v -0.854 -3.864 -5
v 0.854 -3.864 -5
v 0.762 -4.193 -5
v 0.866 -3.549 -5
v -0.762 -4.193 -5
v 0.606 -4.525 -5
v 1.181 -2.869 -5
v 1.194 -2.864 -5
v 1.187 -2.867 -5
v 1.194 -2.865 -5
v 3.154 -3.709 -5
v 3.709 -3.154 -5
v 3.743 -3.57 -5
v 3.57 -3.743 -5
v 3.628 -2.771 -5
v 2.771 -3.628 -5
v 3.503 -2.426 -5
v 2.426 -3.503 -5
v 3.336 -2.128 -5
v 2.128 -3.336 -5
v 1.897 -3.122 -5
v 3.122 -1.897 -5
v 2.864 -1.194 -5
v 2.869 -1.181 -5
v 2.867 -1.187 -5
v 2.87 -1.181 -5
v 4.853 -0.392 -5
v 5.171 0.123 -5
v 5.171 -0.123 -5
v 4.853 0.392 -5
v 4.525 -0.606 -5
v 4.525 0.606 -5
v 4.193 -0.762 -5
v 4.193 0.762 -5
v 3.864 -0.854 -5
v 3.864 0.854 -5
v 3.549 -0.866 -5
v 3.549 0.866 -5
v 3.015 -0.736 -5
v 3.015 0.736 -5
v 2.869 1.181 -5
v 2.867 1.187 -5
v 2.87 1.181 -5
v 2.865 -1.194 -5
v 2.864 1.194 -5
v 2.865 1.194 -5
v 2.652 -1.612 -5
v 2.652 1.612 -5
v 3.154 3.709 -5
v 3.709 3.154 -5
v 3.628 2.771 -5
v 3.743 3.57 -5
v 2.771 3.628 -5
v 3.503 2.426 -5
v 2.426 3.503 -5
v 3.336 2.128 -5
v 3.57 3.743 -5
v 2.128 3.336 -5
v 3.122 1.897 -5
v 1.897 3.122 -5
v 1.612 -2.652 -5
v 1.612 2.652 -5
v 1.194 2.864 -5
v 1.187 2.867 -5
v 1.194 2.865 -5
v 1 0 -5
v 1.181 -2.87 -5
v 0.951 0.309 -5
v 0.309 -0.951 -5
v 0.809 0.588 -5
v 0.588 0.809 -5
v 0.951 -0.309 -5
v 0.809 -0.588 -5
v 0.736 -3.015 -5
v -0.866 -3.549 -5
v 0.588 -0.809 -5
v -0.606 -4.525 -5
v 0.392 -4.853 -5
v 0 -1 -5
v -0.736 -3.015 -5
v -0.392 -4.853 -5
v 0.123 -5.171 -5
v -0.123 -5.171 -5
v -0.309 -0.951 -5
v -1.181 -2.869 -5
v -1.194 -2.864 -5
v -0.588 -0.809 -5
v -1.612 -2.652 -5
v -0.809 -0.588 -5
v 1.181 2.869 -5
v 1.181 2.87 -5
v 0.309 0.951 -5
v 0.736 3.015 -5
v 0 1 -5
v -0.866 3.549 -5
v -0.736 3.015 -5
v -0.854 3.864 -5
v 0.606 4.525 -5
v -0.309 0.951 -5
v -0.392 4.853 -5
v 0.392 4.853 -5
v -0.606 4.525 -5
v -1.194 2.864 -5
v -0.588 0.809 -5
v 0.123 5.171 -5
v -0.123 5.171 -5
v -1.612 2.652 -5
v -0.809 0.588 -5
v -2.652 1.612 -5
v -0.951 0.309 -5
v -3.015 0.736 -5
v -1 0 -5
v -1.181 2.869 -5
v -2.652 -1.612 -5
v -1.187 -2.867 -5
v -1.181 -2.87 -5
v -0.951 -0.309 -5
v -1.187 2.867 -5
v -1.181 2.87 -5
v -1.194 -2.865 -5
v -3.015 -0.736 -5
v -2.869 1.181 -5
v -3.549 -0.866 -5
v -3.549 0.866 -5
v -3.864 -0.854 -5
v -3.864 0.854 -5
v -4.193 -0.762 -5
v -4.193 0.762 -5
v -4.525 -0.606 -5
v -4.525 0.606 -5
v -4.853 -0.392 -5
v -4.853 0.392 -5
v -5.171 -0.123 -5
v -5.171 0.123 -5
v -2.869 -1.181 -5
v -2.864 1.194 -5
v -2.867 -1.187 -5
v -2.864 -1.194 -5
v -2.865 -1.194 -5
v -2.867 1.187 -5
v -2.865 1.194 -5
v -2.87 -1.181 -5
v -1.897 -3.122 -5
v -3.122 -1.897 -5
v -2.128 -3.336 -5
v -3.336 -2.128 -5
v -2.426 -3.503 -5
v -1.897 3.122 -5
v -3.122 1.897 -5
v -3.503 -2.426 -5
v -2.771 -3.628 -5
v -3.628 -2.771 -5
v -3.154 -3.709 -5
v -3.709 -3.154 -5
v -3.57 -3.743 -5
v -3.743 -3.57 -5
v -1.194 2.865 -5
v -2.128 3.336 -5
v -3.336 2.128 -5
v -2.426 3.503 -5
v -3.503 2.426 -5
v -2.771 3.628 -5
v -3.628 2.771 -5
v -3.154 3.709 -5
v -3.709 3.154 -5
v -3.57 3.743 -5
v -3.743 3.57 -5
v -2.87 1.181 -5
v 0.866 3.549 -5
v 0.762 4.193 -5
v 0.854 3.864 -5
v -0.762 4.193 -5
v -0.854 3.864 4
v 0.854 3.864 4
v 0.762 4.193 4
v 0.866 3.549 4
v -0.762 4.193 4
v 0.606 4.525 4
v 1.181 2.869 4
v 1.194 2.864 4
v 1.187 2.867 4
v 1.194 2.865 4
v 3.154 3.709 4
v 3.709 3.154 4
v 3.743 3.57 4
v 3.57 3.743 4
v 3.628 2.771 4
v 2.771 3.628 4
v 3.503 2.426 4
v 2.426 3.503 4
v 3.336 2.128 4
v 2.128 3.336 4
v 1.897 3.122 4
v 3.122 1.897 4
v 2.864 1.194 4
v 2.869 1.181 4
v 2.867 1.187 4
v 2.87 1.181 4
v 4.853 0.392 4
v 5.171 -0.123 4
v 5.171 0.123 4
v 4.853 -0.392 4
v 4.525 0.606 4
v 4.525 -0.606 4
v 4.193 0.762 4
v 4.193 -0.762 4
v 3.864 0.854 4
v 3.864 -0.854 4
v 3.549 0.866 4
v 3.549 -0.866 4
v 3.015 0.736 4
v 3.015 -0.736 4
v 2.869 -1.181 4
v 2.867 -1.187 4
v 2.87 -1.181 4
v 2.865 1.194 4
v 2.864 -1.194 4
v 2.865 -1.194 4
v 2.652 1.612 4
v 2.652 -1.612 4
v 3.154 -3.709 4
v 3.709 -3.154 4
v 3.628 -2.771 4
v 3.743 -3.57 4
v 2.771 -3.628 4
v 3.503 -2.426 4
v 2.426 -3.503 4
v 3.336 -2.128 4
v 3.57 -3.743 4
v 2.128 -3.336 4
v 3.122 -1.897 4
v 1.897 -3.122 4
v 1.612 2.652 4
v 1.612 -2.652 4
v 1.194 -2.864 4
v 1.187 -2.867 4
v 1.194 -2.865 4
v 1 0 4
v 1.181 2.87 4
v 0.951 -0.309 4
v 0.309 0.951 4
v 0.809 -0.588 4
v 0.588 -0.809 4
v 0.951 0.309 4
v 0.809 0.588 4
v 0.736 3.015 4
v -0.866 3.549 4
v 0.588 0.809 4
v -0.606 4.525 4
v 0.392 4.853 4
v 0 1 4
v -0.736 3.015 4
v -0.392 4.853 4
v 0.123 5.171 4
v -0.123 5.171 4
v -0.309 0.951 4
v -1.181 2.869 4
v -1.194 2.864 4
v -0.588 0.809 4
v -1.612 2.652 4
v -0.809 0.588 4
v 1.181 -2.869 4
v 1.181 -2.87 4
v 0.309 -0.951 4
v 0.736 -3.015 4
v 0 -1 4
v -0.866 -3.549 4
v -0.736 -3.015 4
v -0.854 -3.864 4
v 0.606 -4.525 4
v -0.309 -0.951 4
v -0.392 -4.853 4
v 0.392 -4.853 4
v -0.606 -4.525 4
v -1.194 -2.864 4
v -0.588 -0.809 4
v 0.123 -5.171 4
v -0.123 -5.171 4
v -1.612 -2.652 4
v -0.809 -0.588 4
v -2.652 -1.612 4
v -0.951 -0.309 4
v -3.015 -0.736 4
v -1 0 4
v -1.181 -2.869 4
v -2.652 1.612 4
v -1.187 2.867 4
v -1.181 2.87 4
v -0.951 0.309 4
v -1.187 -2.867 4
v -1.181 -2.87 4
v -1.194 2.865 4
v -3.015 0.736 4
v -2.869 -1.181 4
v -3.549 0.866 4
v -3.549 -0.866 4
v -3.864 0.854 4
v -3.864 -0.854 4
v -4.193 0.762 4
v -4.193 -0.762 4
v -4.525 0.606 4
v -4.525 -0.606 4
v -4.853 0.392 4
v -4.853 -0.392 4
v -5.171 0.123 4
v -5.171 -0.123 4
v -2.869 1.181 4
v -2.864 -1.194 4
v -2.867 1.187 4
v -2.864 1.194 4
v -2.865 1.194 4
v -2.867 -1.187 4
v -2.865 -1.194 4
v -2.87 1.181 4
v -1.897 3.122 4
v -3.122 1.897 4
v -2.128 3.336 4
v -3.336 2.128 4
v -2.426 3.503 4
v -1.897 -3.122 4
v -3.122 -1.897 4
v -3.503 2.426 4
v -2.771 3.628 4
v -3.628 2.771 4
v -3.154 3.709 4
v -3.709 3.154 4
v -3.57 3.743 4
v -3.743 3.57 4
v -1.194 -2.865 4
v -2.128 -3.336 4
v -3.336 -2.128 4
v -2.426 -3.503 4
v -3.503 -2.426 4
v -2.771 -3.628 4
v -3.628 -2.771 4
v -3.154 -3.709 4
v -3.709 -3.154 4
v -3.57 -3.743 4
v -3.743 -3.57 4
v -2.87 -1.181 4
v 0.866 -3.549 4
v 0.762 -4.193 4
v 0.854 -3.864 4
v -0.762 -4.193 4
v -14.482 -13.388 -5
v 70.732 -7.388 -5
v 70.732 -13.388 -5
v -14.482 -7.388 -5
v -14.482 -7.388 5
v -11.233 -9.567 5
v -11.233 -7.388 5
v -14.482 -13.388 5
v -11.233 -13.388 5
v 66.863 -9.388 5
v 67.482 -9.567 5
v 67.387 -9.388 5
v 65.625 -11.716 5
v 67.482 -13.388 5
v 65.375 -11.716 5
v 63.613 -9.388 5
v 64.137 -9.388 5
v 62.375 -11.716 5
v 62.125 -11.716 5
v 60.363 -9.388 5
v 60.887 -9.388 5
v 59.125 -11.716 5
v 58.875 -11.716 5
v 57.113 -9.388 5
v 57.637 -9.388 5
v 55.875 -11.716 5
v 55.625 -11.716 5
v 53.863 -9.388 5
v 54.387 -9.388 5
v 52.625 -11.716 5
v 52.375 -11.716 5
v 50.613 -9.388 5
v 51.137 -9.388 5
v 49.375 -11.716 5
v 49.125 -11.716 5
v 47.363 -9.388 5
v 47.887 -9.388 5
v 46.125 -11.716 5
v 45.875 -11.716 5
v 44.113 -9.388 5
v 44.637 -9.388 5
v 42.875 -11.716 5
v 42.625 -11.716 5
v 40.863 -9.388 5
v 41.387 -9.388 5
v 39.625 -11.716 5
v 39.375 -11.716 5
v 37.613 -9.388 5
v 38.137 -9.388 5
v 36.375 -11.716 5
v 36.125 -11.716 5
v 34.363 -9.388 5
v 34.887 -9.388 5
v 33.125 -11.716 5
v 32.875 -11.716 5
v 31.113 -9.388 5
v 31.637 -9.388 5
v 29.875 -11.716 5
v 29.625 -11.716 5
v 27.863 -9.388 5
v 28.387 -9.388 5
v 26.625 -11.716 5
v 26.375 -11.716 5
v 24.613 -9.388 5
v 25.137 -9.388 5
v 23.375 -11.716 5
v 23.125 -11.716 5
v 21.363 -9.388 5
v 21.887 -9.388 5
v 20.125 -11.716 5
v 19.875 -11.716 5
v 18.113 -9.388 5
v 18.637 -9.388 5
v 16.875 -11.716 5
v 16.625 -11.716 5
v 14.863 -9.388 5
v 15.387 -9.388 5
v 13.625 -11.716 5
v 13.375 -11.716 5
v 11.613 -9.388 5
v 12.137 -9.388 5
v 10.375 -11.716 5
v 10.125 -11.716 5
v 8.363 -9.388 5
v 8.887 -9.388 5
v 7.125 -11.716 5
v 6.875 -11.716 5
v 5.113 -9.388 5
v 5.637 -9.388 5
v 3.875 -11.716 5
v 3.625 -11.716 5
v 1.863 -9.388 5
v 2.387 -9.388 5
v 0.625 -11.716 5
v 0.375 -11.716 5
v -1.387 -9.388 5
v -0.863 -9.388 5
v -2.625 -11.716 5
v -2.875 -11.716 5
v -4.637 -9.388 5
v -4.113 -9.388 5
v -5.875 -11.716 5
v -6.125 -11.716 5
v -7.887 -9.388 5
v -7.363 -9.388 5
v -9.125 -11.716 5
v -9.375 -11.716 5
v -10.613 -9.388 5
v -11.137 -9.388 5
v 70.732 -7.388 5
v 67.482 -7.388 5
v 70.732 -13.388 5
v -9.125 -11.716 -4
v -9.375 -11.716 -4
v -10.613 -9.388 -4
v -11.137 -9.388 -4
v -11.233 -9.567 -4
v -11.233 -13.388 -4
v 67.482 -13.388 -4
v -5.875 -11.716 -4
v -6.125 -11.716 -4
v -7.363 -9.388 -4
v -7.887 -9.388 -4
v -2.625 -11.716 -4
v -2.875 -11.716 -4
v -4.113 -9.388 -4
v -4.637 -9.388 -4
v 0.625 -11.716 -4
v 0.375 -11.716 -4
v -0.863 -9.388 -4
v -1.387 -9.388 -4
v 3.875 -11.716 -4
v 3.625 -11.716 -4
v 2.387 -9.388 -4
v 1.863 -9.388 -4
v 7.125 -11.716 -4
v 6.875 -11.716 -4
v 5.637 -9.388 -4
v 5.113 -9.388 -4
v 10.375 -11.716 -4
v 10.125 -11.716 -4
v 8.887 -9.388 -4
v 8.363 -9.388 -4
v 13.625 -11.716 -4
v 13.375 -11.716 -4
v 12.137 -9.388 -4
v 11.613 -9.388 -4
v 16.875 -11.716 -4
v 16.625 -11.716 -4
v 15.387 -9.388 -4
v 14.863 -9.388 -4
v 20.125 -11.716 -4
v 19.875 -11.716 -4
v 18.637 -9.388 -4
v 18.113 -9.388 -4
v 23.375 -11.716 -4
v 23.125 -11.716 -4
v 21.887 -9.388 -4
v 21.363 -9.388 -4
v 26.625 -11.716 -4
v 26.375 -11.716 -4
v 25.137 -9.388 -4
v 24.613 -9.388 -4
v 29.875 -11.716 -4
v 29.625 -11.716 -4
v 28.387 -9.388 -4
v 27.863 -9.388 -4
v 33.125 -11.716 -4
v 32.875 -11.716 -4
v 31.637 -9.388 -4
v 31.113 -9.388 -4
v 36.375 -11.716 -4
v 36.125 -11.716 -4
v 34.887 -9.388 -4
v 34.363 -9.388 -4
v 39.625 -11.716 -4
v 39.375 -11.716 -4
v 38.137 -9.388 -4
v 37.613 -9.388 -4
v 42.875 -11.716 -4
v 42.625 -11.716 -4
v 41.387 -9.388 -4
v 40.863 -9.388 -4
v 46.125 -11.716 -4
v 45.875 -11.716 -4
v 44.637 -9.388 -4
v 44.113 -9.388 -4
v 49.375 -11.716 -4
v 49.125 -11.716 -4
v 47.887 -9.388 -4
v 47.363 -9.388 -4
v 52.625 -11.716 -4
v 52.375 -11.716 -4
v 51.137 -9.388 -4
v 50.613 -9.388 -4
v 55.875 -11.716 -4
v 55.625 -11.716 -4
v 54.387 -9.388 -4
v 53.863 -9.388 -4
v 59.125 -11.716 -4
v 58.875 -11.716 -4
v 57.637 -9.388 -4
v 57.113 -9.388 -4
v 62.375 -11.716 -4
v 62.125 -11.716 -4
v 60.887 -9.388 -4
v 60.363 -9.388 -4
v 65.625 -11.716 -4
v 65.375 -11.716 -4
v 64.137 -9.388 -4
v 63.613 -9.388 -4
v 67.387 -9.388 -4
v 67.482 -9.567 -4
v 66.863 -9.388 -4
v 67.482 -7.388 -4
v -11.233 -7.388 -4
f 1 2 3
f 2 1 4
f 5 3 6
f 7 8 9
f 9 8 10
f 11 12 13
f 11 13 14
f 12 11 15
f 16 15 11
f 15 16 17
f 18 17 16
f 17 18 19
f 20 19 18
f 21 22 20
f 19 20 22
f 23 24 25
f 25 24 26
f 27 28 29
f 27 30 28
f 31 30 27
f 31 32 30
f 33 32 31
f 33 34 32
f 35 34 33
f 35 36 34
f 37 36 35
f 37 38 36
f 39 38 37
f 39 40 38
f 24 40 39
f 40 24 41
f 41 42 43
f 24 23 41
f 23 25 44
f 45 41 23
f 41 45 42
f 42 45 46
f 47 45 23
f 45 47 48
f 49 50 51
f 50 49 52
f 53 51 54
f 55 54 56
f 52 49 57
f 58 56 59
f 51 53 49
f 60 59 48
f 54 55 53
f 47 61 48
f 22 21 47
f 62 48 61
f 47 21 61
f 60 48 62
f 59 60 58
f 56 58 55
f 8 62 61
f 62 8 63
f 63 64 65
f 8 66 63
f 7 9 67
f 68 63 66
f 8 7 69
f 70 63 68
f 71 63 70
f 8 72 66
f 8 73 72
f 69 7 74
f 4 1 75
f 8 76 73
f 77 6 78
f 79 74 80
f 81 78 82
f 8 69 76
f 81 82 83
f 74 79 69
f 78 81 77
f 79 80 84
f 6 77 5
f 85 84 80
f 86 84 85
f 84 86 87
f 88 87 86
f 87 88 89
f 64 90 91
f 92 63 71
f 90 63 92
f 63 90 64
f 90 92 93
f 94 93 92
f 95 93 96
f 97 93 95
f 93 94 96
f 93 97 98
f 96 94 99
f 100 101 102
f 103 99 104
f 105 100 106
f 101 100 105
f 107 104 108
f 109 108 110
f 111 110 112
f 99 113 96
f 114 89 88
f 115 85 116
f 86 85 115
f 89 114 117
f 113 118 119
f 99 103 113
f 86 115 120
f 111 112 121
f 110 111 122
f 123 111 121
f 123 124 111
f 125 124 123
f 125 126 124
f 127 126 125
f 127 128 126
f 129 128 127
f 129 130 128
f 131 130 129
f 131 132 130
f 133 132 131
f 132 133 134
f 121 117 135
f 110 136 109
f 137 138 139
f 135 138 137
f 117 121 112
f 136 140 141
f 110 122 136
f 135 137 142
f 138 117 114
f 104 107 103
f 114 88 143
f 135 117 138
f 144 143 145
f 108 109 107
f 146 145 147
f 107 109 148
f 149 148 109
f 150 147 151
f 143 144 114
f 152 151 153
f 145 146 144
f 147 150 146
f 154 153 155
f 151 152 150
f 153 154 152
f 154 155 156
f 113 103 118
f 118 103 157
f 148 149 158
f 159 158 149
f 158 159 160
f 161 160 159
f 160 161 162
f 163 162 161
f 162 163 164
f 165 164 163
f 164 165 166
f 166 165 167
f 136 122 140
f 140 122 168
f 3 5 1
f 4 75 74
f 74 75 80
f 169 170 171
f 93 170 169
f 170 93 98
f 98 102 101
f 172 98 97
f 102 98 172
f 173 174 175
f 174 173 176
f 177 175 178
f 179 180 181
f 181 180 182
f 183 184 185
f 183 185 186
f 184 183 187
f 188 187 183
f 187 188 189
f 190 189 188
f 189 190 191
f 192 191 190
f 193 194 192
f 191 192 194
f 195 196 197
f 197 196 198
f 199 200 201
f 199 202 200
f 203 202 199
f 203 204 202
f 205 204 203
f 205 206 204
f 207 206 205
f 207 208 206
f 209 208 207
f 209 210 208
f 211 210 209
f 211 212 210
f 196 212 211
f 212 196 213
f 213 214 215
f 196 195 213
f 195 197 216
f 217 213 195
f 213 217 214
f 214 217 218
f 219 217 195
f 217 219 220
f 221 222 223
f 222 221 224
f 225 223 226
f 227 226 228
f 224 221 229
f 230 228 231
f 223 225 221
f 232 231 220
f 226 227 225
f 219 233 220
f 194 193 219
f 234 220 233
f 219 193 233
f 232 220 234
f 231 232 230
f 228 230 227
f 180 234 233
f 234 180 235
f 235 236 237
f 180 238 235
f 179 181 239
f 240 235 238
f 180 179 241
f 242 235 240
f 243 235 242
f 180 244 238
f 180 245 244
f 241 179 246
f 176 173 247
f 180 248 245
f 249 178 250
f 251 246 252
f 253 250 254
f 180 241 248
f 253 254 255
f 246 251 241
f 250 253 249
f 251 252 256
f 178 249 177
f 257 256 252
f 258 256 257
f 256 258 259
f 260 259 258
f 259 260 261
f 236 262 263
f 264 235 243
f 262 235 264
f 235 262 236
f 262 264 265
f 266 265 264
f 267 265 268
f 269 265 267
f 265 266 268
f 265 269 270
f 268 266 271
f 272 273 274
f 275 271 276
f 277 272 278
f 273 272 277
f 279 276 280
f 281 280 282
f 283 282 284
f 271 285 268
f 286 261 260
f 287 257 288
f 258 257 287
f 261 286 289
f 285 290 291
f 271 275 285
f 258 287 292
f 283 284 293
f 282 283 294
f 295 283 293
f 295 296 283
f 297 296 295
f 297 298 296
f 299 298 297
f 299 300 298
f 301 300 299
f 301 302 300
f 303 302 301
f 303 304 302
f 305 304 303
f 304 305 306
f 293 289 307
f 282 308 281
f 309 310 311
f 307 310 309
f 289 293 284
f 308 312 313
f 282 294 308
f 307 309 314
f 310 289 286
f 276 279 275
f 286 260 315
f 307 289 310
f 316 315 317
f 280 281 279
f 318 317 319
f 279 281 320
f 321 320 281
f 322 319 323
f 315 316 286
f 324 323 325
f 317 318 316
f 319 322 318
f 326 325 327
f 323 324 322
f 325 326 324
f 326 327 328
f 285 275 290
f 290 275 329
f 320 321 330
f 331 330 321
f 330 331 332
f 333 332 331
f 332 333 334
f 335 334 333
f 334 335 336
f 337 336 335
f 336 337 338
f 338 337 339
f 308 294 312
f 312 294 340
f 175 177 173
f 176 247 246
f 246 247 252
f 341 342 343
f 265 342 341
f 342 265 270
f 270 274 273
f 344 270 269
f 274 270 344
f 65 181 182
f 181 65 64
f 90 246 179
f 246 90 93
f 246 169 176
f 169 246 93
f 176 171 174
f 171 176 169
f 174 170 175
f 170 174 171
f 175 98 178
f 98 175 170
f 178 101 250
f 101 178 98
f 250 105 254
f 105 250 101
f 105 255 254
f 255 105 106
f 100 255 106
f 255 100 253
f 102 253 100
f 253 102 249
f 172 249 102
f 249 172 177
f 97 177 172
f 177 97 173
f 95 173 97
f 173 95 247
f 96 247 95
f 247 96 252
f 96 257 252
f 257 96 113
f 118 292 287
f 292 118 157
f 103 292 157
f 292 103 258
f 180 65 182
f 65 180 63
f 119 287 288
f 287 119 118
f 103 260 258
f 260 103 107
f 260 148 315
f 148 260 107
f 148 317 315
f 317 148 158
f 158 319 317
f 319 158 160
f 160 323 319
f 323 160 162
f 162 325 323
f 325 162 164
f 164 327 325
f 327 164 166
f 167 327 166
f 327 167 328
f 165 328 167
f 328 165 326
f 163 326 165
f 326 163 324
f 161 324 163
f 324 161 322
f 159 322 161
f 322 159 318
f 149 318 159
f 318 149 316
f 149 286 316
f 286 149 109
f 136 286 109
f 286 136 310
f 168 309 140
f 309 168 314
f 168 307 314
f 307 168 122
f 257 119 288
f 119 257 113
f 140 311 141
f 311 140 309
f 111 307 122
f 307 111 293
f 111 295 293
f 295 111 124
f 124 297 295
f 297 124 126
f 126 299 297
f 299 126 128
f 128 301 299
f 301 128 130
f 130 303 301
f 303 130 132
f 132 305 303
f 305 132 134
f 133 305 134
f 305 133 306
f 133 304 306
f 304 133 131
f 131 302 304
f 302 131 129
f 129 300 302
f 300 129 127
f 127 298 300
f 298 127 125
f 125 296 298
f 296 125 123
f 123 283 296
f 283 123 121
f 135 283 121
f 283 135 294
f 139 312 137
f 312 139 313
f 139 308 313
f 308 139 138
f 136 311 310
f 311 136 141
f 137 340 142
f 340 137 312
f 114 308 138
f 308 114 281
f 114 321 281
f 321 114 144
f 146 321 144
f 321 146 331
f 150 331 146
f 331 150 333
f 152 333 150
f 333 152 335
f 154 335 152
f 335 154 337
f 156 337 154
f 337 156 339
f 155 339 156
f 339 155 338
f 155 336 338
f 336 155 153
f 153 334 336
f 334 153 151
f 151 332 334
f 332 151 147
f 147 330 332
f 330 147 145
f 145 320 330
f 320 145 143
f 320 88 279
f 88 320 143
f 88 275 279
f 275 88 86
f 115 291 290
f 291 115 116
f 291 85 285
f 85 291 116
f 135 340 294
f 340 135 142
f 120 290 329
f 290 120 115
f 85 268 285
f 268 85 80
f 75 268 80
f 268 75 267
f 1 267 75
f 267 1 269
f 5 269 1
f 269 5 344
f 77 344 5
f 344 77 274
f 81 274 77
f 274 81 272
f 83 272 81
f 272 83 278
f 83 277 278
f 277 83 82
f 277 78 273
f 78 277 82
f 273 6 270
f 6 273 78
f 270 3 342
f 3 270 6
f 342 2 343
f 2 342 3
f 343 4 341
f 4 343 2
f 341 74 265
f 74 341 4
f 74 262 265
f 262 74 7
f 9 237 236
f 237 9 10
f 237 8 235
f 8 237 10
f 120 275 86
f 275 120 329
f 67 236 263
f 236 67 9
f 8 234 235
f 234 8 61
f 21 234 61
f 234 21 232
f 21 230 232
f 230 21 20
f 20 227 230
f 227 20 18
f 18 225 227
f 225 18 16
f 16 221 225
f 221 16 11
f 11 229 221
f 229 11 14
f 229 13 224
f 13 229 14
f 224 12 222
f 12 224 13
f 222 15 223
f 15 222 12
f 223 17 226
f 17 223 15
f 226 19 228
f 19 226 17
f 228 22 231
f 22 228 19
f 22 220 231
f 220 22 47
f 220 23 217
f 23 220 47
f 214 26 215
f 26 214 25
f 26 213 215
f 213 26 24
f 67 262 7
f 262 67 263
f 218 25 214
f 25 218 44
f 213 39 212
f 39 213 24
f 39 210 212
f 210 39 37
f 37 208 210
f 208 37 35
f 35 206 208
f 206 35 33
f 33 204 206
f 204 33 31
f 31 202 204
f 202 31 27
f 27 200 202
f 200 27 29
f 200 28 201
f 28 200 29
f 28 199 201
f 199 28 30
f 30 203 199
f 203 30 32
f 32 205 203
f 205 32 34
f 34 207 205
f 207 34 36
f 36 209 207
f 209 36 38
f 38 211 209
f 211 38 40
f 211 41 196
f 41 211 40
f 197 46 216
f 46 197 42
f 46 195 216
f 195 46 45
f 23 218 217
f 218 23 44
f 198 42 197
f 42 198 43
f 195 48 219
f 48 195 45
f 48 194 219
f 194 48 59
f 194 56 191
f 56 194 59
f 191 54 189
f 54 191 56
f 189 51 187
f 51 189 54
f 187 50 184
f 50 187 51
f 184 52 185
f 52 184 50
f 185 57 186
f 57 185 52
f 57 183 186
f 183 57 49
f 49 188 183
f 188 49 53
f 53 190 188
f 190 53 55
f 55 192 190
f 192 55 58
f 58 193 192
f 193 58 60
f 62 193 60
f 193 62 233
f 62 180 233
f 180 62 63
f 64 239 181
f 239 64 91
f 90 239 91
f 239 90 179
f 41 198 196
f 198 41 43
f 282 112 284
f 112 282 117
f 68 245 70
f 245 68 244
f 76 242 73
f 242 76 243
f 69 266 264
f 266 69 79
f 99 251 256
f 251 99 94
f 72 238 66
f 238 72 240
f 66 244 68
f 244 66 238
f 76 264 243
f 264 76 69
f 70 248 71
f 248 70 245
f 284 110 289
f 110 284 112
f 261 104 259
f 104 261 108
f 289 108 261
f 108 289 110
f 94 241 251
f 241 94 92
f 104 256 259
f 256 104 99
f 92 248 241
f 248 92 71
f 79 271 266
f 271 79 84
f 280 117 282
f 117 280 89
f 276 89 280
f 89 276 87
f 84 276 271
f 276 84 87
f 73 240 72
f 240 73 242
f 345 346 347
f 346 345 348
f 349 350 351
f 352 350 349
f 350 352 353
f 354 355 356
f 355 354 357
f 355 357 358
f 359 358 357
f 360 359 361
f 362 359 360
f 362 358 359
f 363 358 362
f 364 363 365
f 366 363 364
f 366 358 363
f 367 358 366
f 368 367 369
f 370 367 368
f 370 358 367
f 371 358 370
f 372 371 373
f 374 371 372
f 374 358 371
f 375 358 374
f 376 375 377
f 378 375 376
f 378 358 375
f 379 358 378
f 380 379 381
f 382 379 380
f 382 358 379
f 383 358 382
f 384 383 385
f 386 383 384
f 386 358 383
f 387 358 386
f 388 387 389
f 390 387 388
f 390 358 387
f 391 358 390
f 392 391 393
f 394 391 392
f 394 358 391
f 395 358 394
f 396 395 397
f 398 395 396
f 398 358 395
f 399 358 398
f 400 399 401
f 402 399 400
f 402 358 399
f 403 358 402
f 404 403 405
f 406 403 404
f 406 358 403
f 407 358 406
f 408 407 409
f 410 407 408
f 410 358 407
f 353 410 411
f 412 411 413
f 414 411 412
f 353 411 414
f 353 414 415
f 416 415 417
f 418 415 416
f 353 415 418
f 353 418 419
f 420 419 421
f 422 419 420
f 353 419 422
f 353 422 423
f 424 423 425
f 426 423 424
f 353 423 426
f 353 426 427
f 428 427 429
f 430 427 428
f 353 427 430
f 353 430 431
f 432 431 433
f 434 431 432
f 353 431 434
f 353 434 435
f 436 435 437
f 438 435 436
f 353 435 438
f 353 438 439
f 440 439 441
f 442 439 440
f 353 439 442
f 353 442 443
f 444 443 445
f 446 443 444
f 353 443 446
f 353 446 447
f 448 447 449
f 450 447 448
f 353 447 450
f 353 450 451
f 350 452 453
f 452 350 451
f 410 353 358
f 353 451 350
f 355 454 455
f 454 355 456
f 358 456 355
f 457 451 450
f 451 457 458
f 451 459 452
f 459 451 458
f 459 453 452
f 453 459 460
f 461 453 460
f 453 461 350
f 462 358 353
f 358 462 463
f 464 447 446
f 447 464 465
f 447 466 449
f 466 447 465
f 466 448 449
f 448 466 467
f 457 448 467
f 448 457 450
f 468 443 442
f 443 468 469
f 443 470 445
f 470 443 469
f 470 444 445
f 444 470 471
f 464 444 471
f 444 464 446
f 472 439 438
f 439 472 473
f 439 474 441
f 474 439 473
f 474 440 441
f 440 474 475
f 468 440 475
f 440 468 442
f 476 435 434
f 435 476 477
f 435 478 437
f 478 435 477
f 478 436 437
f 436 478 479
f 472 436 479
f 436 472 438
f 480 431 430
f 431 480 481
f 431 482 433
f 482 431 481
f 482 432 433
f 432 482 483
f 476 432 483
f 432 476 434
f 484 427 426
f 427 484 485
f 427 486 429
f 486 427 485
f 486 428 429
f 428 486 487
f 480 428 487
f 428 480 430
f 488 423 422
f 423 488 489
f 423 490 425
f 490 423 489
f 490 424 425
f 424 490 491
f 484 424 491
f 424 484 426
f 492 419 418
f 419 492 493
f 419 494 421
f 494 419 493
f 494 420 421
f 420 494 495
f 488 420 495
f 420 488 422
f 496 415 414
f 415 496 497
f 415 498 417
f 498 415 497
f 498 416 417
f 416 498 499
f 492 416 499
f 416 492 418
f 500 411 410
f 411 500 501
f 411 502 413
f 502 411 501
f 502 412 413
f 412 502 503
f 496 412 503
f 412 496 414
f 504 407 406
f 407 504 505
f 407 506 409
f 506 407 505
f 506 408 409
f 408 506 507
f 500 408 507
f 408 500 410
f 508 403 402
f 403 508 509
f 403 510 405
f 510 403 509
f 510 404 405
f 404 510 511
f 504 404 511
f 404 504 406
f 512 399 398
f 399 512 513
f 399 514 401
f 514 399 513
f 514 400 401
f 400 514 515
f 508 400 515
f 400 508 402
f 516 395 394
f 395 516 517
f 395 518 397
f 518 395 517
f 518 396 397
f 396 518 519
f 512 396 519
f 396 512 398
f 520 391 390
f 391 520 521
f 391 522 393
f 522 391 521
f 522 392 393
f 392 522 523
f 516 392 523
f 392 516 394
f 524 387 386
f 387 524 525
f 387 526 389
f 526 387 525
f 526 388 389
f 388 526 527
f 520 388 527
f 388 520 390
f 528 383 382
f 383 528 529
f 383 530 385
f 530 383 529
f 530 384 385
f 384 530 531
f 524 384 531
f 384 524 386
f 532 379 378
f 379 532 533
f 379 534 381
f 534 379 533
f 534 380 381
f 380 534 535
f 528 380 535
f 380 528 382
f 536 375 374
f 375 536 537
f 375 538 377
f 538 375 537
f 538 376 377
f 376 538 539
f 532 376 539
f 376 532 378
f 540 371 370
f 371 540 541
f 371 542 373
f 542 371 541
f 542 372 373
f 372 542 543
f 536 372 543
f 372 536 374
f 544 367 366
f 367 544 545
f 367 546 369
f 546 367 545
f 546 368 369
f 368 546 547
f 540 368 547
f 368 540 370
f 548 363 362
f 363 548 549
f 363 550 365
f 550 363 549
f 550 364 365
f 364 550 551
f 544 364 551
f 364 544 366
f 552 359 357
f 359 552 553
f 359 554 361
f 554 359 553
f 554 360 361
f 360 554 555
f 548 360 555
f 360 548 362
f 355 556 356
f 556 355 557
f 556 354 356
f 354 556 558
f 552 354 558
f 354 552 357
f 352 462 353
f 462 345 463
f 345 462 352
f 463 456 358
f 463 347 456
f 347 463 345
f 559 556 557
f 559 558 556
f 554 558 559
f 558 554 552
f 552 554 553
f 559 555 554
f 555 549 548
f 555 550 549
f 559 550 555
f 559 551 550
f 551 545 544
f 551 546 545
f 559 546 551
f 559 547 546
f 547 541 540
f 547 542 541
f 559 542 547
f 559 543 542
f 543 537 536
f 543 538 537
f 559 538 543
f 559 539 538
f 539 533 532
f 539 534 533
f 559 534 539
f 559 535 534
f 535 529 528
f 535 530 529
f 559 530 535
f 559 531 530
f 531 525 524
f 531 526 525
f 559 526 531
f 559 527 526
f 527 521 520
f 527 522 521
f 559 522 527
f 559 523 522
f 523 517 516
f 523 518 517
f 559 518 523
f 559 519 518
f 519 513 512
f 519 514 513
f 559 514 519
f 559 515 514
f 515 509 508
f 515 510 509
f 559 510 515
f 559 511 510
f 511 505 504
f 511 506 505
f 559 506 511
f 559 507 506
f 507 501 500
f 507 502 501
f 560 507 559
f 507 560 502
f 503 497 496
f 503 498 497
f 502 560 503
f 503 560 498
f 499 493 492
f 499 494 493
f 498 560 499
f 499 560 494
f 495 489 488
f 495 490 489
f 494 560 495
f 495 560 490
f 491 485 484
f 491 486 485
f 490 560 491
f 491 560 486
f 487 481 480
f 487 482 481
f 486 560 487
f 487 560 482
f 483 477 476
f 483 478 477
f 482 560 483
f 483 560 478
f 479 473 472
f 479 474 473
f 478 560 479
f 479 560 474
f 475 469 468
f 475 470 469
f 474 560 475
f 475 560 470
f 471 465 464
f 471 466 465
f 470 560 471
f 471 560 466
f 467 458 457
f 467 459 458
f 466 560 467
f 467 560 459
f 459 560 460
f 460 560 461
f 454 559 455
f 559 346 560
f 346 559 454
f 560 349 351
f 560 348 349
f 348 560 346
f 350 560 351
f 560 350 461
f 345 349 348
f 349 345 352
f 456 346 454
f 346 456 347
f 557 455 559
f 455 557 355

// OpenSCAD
//This is a modification of " Public Domain Parametric Involute Spur Gear (and involute helical gear and involute rack)
// by Leemon Baird, 2011, Leemon@Leemon.com
//http://www.thingiverse.com/thing:5505  "

//Modifications by racatack June 2016:
//  -Incorporated 'module InvoluteGear_rack()' from the 11/11/15 comment by quisam2342 in thing:5505 to fix noted problems in rack generation at various tooth sizes
//  -Added a section for an optional 'backboard' that can be used to stiffen an otherwise skinny rack
//  -Added sections for optional Stop Blocks at either or both ends of a rack
//  -Removed extra gears from the example since I only need one pinion. See thing:5505 example section to gain more insight into gear generation.





//////////////////////////////////////////////////////////////////////////////////////////////
// Public Domain Parametric Involute Spur Gear (and involute helical gear and involute rack)
// version 1.1
// by Leemon Baird, 2011, Leemon@Leemon.com
//http://www.thingiverse.com/thing:5505
//
// This file is public domain.  Use it for any purpose, including commercial
// applications.  Attribution would be nice, but is not required.  There is
// no warranty of any kind, including its correctness, usefulness, or safety.
// 
// This is parameterized involute spur (or helical) gear.  It is much simpler and less powerful than
// others on Thingiverse.  But it is public domain.  I implemented it from scratch from the 
// descriptions and equations on Wikipedia and the web, using Mathematica for calculations and testing,
// and I now release it into the public domain.
//
//		http://en.wikipedia.org/wiki/Involute_gear
//		http://en.wikipedia.org/wiki/Gear
//		http://en.wikipedia.org/wiki/List_of_gear_nomenclature
//		http://gtrebaol.free.fr/doc/catia/spur_gear.html
//		http://www.cs.cmu.edu/~rapidproto/mechanisms/chpt7.html
//
// The module gear() gives an involute spur gear, with reasonable defaults for all the parameters.
// Normally, you should just choose the first 4 parameters, and let the rest be default values.
// The module gear() gives a gear in the XY plane, centered on the origin, with one tooth centered on
// the positive Y axis.  The various functions below it take the same parameters, and return various
// measurements for the gear.  The most important is pitch_radius, which tells how far apart to space
// gears that are meshing, and adendum_radius, which gives the size of the region filled by the gear.
// A gear has a "pitch circle", which is an invisible circle that cuts through the middle of each
// tooth (though not the exact center). In order for two gears to mesh, their pitch circles should 
// just touch.  So the distance between their centers should be pitch_radius() for one, plus pitch_radius() 
// for the other, which gives the radii of their pitch circles.
//
// In order for two gears to mesh, they must have the same mm_per_tooth and pressure_angle parameters.  
// mm_per_tooth gives the number of millimeters of arc around the pitch circle covered by one tooth and one
// space between teeth.  The pitch angle controls how flat or bulged the sides of the teeth are.  Common
// values include 14.5 degrees and 20 degrees, and occasionally 25.  Though I've seen 28 recommended for
// plastic gears. Larger numbers bulge out more, giving stronger teeth, so 28 degrees is the default here.
//
// The ratio of number_of_teeth for two meshing gears gives how many times one will make a full 
// revolution when the the other makes one full revolution.  If the two numbers are coprime (i.e. 
// are not both divisible by the same number greater than 1), then every tooth on one gear
// will meet every tooth on the other, for more even wear.  So coprime numbers of teeth are good.
//
// The module rack() gives a rack, which is a bar with teeth.  A rack can mesh with any
// gear that has the same mm_per_tooth and pressure_angle.
//
// Some terminology: 
// The outline of a gear is a smooth circle (the "pitch circle") which has mountains and valleys
// added so it is toothed.  So there is an inner circle (the "root circle") that touches the 
// base of all the teeth, an outer circle that touches the tips of all the teeth,
// and the invisible pitch circle in between them.  There is also a "base circle", which can be smaller than
// all three of the others, which controls the shape of the teeth.  The side of each tooth lies on the path 
// that the end of a string would follow if it were wrapped tightly around the base circle, then slowly unwound.  
// That shape is an "involute", which gives this type of gear its name.
//
//////////////////////////////////////////////////////////////////////////////////////////////

//An involute spur gear, with reasonable defaults for all the parameters.
//Normally, you should just choose the first 4 parameters, and let the rest be default values.
//Meshing gears must match in mm_per_tooth, pressure_angle, and twist,
//and be separated by the sum of their pitch radii, which can be found with pitch_radius().
module gear (
	mm_per_tooth    = 3,    //this is the "circular pitch", the circumference of the pitch circle divided by the number of teeth
	number_of_teeth = 11,   //total number of teeth around the entire perimeter
	thickness       = 6,    //thickness of gear in mm
	hole_diameter   = 3,    //diameter of the hole in the center, in mm
	twist           = 0,    //teeth rotate this many degrees from bottom of gear to top.  360 makes the gear a screw with each thread going around once
	teeth_to_hide   = 0,    //number of teeth to delete to make this only a fraction of a circle
	pressure_angle  = 28,   //Controls how straight or bulged the tooth sides are. In degrees.
	clearance       = 0.0,  //gap between top of a tooth on one gear and bottom of valley on a meshing gear (in millimeters)
	backlash        = 0.0   //gap between two meshing teeth, in the direction along the circumference of the pitch circle
) {
	assign(pi = 3.1415926)
	assign(p  = mm_per_tooth * number_of_teeth / pi / 2)  //radius of pitch circle
	assign(c  = p + mm_per_tooth / pi - clearance)        //radius of outer circle
	assign(b  = p*cos(pressure_angle))                    //radius of base circle
	assign(r  = p-(c-p)-clearance)                        //radius of root circle
	assign(t  = mm_per_tooth/2-backlash/2)                //tooth thickness at pitch circle
	assign(k  = -iang(b, p) - t/2/p/pi*180) {             //angle to where involute meets base circle on each side of tooth
		difference() {
			for (i = [0:number_of_teeth-teeth_to_hide-1] )
				rotate([0,0,i*360/number_of_teeth])
					linear_extrude(height = thickness, center = true, convexity = 10, twist = twist)
						polygon(
							points=[
								[0, -hole_diameter/10],
								polar(r, -181/number_of_teeth),
								polar(r, r<b ? k : -180/number_of_teeth),
								q7(0/5,r,b,c,k, 1),q7(1/5,r,b,c,k, 1),q7(2/5,r,b,c,k, 1),q7(3/5,r,b,c,k, 1),q7(4/5,r,b,c,k, 1),q7(5/5,r,b,c,k, 1),
								q7(5/5,r,b,c,k,-1),q7(4/5,r,b,c,k,-1),q7(3/5,r,b,c,k,-1),q7(2/5,r,b,c,k,-1),q7(1/5,r,b,c,k,-1),q7(0/5,r,b,c,k,-1),
								polar(r, r<b ? -k : 180/number_of_teeth),
								polar(r, 181/number_of_teeth)
							],
 							paths=[[0,1,2,3,4,5,6,7,8,9,10,11,12,13,14,15,16]]
						);
			cylinder(h=2*thickness+1, r=hole_diameter/2, center=true, $fn=20);
		}
	}
};	
//these 4 functions are used by gear
function polar(r,theta)   = r*[sin(theta), cos(theta)];                            //convert polar to cartesian coordinates
function iang(r1,r2)      = sqrt((r2/r1)*(r2/r1) - 1)/3.1415926*180 - acos(r1/r2); //unwind a string this many degrees to go from radius r1 to radius r2
function q7(f,r,b,r2,t,s) = q6(b,s,t,(1-f)*max(b,r)+f*r2);                         //radius a fraction f up the curved side of the tooth 
function q6(b,s,t,d)      = polar(d,s*(iang(b,d)+t));                              //point at radius d on the involute curve

//a rack, which is a straight line with teeth (the same as a segment from a giant gear with a huge number of teeth).
//The "pitch circle" is a line along the X axis.
//module rack (
//	mm_per_tooth    = 3,    //this is the "circular pitch", the circumference of the pitch circle divided by the number //of teeth
//	number_of_teeth = 11,   //total number of teeth along the rack
//	thickness       = 6,    //thickness of rack in mm (affects each tooth)
//	height          = 120,   //height of rack in mm, from tooth top to far side of rack.
//	pressure_angle  = 28,   //Controls how straight or bulged the tooth sides are. In degrees.
//	backlash        = 0.0   //gap between two meshing teeth, in the direction along the circumference of the pitch circle
//) {
//	assign(pi = 3.1415926)
//	assign(a = mm_per_tooth / pi) //addendum
//	assign(t = a*cos(pressure_angle)-1)         //tooth side is tilted so top/bottom corners move this amount
//		for (i = [0:number_of_teeth-1] )
//			translate([i*mm_per_tooth,0,0])
//				linear_extrude(height = thickness, center = true, convexity = 10)
//					polygon(
//						points=[
//							[-mm_per_tooth * 3/4,                 a-height],
//							[-mm_per_tooth * 3/4 - backlash,     -a],
//							[-mm_per_tooth * 1/4 + backlash - t, -a],
//							[-mm_per_tooth * 1/4 + backlash + t,  a],
//							[ mm_per_tooth * 1/4 - backlash - t,  a],
//							[ mm_per_tooth * 1/4 - backlash + t, -a],
//							[ mm_per_tooth * 3/4 + backlash,     -a],
//							[ mm_per_tooth * 3/4,                 a-height],
//						],
//						paths=[[0,1,2,3,4,5,6,7]]
//					);
//};	


  //rac note - This section generates the rack body and teeth. It is from the 11/11/15 comment by quisam2342 in thing:5505 to fix noted problems with rack generation, and replaces the original 'module rack()'
////////////////////////////////////////////////////////////////////////////////////////////////
// The module InvoluteGear_rack() gives a involute gear rack, which is a bar with teeth.
// A rack can mesh with any gear that has the same mm_per_tooth and pressure_angle.
// The "pitch circle" is a line along the X axis.
//
// mm_per_tooth     this is the "circular pitch", the circumference of the pitch circle
//                  divided by the number of teeth
//
// number_of_teeth  total number of teeth along the rack
//
// thickness        thickness of rack in mm
//
// height           height of rack in mm, from tooth top to far side of rack
//
// pressure_angle   controls how straight or bulged the tooth sides are, in degrees
//
// clearance        gap between top of a tooth on one gear and bottom of valley
//                  on a meshing gear, in millimeters
//
// backlash         gap between two meshing teeth, in the direction along the circumference
//                  of the pitch circle
////////////////////////////////////////////////////////////////////////////////////////////////



module InvoluteGear_rack (
    mm_per_tooth    = 3,   //Default numbers in this section get overridden by numbers in 'example rack and pinion' section, so set your values there.
    number_of_teeth = 11,
    thickness       = 6,
    height          = 4,
    
  //rac - Added variables for backboard and stop blocks: 
 //set your values in the 'example rack and pinion' section, as defaults given here will be overridden by that section 
    backboard_thickness = 2.0,
    backboard_height = 1.0, 
    stop_height = backboard_height, 
    left_stop_enable = 1, 
    right_stop_enable = 1,
    
//These defaults are not redefined in the example section:
    pressure_angle  = 28,  
    clearance       = 0.0,
    backlash        = 0.0

)

{
    // addendum - tooth height above pitch line
    assign(addendum =        module_value(mm_per_tooth) - clearance)

    // dedendum - tooth height below pitch line
    assign(dedendum = 1.25 * module_value(mm_per_tooth)            ) 


    for (i = [0:number_of_teeth-1] )
        translate([(i+0.5)*mm_per_tooth,height-addendum,0])
            linear_extrude(height = thickness, center = true, convexity = 10)  //'height' parameter here is not the same as 'height' parameter of module
                polygon(
                    points=[
                        [-1/2 * mm_per_tooth,                                              addendum-height],
                        [-1/2 * mm_per_tooth,                                             -dedendum],
                        [-1/4 * mm_per_tooth + backlash - dedendum * tan(pressure_angle), -dedendum],
                        [-1/4 * mm_per_tooth + backlash + addendum * tan(pressure_angle),  addendum],
                        [ 1/4 * mm_per_tooth - backlash - addendum * tan(pressure_angle),  addendum],
                        [ 1/4 * mm_per_tooth - backlash + dedendum * tan(pressure_angle), -dedendum],
                        [ 1/2 * mm_per_tooth,                                             -dedendum],
                        [ 1/2 * mm_per_tooth,                                              addendum-height],
                    ],
                    paths=[[0,1,2,3,4,5,6,7]]
                );

   //rac -added - This section optionally creates a 'stop block' at the left end of the rack
            translate([(-0.11)*mm_per_tooth,0,0.5*(-thickness)])  
            linear_extrude(height = left_stop_enable*thickness, center = false, convexity = 10)
                polygon(
                    points=[
                        [-1/2 * mm_per_tooth,height+stop_height],   //stop_height extends stop block above teeth, change the number to change the extension amount
                        [-1/2 * mm_per_tooth,0],
                        [ 1/2 * mm_per_tooth,0],
                        [ 1/2 * mm_per_tooth,height+stop_height],   //stop_height extends stop block above teeth, change the number to change the extension amount
                    ],
                    paths=[[0,1,2,3]]
                );


    //rac -added - This section optionally creates a 'stop block' at the right end of the rack
            translate([(0.11+number_of_teeth)*mm_per_tooth,0,0.5*(-thickness)])  
            linear_extrude(height = right_stop_enable*thickness, center = false, convexity = 10)
                polygon(
                    points=[
                        [-1/2 * mm_per_tooth,height+stop_height],   //stop_height extends stop block above teeth
                        [-1/2 * mm_per_tooth,0],
                        [ 1/2 * mm_per_tooth,0],
                        [ 1/2 * mm_per_tooth,height+stop_height],   //stop_height extends stop block above teeth
                    ],
                    paths=[[0,1,2,3]]
                );


    //rac -added - This section optionally creates a 'backboard' on one side of the rack. Can be used to add stiffness for a 'thin' rack (i.e. a rack with low height and/or thickness numbers) or if a large negative height is used it can extend under the rack as a mounting flange.
    for (i = [0:number_of_teeth-1] )
        translate([(i+0.5)*mm_per_tooth,0,0.5*(-thickness+backboard_thickness)])    
        //0.55*(-thickness+backboard_thickness) starts the backboard at one side of the rack and extrudes it inward
            linear_extrude(height = backboard_thickness, center = true, convexity = 10)
                polygon(
                    points=[
                        [-1/2 * mm_per_tooth,height+backboard_height],   //backboard_height extends backboard above teeth
                        [-1/2 * mm_per_tooth,0],

                        [ 1/2 * mm_per_tooth,0],
                        [ 1/2 * mm_per_tooth,height+backboard_height],   //backboard_height extends backboard above teeth
                    ],
                    paths=[[0,1,2,3]]
                );


}


//These 5 functions let the user find the derived dimensions of the gear.
//A gear fits within a circle of radius outer_radius, and two gears should have
//their centers separated by the sum of their pictch_radius.
function circular_pitch  (mm_per_tooth=3) = mm_per_tooth;                     //tooth density expressed as "circular pitch" in millimeters
function diametral_pitch (mm_per_tooth=3) = 3.1415926 / mm_per_tooth;         //tooth density expressed as "diametral pitch" in teeth per millimeter
function module_value    (mm_per_tooth=3) = mm_per_tooth / 3.1415926;                //tooth density expressed as "module" or "modulus" in millimeters
function pitch_radius    (mm_per_tooth=3,number_of_teeth=11) = mm_per_tooth * number_of_teeth / 3.1415926 / 2;
function outer_radius    (mm_per_tooth=3,number_of_teeth=11,clearance=0.1)    //The gear fits entirely within a cylinder of this radius.
	= mm_per_tooth*(1+number_of_teeth/2)/3.1415926  - clearance;              

//////////////////////////////////////////////////////////////////////////////////////////////
//example rack and pinion: 
//ENTER YOUR VALUES HERE: (not in InvoluteGear_rack() defaults)

//all distances in mm
n1 = 8; //red gear number of teeth
n5 = 25;  //gray rack number of teeth
mm_per_tooth = 3.25; //all meshing gears need the same mm_per_tooth (and the same pressure_angle)
thickness    = 10;  // depth of the rack, including backboard if any. The pinion will be this depth minus the backboard_thickness
hole         = 2;   //hole diameter in pinion gear
height       = 4;  // distance from bottom of the rack to the tips of the teeth

//rac - Added - Set your values for Backboard and Stop Blocks here 
backboard_thickness = 1.0; //set to zero for no backboard
backboard_height = 2;   //set to zero for top of backboard to be even with tips of teeth, a positive number will extend above the teeth by the chosen amount, vice-versa for negative (use large negative to make a flange on underside of rack)
stop_height = 2; //Stop Blocks will extend this much above the teeth, can be positive or negative
left_stop_enable = 1;  //set to 1 to generate Left Stop Block, set to 0 to disable
right_stop_enable = 1;  //set to 1 to generate Right Stop Block, set to 0 to disable

//end of inputs -------------------------------------------------------

d1 =pitch_radius(mm_per_tooth,n1);

//Generation of pinion gear:
translate([ 0,    0, -.5*backboard_thickness]) rotate([0,0, $t*360/n1])                 color([1.00,0.75,0.75]) gear(mm_per_tooth,n1,(thickness-backboard_thickness),hole); //rac -RE above: 'thickness-backboard_thickness' is used here to reduce gear thickness for backboard on rack, The '-.5*backboard_thickness' in translate puts gear bottom even with rack bottom

//Generation of rack, and Relative positioning of gear and rack:
translate([(-floor(n5/2)-floor(n1/2)+$t+n1/2-1/2), -height-backboard_height-d1-mm_per_tooth, 0]) rotate([0,0,0]) color([0.75,0.75,0.75]) InvoluteGear_rack(mm_per_tooth,n5,thickness,height,backboard_thickness,backboard_height,stop_height,left_stop_enable,right_stop_enable);   //rac - In the above 'translate' instruction, the middle parameter sets spacing between the rack and the pinion. I've set it to '-height-backboard_height-d1-mm_per_tooth' to give a proportionate offset that allows for ease of printing for most sets of gear & rack parameters. If you use a large negative backboard height the gear and rack may overlap. That can be fixed by substituting some other number/formula for '-height-backboard_height-d1-mm_per_tooth'. Try for example -3*d1, or just subtract an additional fixed offset from what's in there now (e.g. (-height-backboard_height-d1-mm_per_tooth)-14.)

//end of example rack and pinion 
//////////////////////////////////////////////////////////////////////////////////////////////////
